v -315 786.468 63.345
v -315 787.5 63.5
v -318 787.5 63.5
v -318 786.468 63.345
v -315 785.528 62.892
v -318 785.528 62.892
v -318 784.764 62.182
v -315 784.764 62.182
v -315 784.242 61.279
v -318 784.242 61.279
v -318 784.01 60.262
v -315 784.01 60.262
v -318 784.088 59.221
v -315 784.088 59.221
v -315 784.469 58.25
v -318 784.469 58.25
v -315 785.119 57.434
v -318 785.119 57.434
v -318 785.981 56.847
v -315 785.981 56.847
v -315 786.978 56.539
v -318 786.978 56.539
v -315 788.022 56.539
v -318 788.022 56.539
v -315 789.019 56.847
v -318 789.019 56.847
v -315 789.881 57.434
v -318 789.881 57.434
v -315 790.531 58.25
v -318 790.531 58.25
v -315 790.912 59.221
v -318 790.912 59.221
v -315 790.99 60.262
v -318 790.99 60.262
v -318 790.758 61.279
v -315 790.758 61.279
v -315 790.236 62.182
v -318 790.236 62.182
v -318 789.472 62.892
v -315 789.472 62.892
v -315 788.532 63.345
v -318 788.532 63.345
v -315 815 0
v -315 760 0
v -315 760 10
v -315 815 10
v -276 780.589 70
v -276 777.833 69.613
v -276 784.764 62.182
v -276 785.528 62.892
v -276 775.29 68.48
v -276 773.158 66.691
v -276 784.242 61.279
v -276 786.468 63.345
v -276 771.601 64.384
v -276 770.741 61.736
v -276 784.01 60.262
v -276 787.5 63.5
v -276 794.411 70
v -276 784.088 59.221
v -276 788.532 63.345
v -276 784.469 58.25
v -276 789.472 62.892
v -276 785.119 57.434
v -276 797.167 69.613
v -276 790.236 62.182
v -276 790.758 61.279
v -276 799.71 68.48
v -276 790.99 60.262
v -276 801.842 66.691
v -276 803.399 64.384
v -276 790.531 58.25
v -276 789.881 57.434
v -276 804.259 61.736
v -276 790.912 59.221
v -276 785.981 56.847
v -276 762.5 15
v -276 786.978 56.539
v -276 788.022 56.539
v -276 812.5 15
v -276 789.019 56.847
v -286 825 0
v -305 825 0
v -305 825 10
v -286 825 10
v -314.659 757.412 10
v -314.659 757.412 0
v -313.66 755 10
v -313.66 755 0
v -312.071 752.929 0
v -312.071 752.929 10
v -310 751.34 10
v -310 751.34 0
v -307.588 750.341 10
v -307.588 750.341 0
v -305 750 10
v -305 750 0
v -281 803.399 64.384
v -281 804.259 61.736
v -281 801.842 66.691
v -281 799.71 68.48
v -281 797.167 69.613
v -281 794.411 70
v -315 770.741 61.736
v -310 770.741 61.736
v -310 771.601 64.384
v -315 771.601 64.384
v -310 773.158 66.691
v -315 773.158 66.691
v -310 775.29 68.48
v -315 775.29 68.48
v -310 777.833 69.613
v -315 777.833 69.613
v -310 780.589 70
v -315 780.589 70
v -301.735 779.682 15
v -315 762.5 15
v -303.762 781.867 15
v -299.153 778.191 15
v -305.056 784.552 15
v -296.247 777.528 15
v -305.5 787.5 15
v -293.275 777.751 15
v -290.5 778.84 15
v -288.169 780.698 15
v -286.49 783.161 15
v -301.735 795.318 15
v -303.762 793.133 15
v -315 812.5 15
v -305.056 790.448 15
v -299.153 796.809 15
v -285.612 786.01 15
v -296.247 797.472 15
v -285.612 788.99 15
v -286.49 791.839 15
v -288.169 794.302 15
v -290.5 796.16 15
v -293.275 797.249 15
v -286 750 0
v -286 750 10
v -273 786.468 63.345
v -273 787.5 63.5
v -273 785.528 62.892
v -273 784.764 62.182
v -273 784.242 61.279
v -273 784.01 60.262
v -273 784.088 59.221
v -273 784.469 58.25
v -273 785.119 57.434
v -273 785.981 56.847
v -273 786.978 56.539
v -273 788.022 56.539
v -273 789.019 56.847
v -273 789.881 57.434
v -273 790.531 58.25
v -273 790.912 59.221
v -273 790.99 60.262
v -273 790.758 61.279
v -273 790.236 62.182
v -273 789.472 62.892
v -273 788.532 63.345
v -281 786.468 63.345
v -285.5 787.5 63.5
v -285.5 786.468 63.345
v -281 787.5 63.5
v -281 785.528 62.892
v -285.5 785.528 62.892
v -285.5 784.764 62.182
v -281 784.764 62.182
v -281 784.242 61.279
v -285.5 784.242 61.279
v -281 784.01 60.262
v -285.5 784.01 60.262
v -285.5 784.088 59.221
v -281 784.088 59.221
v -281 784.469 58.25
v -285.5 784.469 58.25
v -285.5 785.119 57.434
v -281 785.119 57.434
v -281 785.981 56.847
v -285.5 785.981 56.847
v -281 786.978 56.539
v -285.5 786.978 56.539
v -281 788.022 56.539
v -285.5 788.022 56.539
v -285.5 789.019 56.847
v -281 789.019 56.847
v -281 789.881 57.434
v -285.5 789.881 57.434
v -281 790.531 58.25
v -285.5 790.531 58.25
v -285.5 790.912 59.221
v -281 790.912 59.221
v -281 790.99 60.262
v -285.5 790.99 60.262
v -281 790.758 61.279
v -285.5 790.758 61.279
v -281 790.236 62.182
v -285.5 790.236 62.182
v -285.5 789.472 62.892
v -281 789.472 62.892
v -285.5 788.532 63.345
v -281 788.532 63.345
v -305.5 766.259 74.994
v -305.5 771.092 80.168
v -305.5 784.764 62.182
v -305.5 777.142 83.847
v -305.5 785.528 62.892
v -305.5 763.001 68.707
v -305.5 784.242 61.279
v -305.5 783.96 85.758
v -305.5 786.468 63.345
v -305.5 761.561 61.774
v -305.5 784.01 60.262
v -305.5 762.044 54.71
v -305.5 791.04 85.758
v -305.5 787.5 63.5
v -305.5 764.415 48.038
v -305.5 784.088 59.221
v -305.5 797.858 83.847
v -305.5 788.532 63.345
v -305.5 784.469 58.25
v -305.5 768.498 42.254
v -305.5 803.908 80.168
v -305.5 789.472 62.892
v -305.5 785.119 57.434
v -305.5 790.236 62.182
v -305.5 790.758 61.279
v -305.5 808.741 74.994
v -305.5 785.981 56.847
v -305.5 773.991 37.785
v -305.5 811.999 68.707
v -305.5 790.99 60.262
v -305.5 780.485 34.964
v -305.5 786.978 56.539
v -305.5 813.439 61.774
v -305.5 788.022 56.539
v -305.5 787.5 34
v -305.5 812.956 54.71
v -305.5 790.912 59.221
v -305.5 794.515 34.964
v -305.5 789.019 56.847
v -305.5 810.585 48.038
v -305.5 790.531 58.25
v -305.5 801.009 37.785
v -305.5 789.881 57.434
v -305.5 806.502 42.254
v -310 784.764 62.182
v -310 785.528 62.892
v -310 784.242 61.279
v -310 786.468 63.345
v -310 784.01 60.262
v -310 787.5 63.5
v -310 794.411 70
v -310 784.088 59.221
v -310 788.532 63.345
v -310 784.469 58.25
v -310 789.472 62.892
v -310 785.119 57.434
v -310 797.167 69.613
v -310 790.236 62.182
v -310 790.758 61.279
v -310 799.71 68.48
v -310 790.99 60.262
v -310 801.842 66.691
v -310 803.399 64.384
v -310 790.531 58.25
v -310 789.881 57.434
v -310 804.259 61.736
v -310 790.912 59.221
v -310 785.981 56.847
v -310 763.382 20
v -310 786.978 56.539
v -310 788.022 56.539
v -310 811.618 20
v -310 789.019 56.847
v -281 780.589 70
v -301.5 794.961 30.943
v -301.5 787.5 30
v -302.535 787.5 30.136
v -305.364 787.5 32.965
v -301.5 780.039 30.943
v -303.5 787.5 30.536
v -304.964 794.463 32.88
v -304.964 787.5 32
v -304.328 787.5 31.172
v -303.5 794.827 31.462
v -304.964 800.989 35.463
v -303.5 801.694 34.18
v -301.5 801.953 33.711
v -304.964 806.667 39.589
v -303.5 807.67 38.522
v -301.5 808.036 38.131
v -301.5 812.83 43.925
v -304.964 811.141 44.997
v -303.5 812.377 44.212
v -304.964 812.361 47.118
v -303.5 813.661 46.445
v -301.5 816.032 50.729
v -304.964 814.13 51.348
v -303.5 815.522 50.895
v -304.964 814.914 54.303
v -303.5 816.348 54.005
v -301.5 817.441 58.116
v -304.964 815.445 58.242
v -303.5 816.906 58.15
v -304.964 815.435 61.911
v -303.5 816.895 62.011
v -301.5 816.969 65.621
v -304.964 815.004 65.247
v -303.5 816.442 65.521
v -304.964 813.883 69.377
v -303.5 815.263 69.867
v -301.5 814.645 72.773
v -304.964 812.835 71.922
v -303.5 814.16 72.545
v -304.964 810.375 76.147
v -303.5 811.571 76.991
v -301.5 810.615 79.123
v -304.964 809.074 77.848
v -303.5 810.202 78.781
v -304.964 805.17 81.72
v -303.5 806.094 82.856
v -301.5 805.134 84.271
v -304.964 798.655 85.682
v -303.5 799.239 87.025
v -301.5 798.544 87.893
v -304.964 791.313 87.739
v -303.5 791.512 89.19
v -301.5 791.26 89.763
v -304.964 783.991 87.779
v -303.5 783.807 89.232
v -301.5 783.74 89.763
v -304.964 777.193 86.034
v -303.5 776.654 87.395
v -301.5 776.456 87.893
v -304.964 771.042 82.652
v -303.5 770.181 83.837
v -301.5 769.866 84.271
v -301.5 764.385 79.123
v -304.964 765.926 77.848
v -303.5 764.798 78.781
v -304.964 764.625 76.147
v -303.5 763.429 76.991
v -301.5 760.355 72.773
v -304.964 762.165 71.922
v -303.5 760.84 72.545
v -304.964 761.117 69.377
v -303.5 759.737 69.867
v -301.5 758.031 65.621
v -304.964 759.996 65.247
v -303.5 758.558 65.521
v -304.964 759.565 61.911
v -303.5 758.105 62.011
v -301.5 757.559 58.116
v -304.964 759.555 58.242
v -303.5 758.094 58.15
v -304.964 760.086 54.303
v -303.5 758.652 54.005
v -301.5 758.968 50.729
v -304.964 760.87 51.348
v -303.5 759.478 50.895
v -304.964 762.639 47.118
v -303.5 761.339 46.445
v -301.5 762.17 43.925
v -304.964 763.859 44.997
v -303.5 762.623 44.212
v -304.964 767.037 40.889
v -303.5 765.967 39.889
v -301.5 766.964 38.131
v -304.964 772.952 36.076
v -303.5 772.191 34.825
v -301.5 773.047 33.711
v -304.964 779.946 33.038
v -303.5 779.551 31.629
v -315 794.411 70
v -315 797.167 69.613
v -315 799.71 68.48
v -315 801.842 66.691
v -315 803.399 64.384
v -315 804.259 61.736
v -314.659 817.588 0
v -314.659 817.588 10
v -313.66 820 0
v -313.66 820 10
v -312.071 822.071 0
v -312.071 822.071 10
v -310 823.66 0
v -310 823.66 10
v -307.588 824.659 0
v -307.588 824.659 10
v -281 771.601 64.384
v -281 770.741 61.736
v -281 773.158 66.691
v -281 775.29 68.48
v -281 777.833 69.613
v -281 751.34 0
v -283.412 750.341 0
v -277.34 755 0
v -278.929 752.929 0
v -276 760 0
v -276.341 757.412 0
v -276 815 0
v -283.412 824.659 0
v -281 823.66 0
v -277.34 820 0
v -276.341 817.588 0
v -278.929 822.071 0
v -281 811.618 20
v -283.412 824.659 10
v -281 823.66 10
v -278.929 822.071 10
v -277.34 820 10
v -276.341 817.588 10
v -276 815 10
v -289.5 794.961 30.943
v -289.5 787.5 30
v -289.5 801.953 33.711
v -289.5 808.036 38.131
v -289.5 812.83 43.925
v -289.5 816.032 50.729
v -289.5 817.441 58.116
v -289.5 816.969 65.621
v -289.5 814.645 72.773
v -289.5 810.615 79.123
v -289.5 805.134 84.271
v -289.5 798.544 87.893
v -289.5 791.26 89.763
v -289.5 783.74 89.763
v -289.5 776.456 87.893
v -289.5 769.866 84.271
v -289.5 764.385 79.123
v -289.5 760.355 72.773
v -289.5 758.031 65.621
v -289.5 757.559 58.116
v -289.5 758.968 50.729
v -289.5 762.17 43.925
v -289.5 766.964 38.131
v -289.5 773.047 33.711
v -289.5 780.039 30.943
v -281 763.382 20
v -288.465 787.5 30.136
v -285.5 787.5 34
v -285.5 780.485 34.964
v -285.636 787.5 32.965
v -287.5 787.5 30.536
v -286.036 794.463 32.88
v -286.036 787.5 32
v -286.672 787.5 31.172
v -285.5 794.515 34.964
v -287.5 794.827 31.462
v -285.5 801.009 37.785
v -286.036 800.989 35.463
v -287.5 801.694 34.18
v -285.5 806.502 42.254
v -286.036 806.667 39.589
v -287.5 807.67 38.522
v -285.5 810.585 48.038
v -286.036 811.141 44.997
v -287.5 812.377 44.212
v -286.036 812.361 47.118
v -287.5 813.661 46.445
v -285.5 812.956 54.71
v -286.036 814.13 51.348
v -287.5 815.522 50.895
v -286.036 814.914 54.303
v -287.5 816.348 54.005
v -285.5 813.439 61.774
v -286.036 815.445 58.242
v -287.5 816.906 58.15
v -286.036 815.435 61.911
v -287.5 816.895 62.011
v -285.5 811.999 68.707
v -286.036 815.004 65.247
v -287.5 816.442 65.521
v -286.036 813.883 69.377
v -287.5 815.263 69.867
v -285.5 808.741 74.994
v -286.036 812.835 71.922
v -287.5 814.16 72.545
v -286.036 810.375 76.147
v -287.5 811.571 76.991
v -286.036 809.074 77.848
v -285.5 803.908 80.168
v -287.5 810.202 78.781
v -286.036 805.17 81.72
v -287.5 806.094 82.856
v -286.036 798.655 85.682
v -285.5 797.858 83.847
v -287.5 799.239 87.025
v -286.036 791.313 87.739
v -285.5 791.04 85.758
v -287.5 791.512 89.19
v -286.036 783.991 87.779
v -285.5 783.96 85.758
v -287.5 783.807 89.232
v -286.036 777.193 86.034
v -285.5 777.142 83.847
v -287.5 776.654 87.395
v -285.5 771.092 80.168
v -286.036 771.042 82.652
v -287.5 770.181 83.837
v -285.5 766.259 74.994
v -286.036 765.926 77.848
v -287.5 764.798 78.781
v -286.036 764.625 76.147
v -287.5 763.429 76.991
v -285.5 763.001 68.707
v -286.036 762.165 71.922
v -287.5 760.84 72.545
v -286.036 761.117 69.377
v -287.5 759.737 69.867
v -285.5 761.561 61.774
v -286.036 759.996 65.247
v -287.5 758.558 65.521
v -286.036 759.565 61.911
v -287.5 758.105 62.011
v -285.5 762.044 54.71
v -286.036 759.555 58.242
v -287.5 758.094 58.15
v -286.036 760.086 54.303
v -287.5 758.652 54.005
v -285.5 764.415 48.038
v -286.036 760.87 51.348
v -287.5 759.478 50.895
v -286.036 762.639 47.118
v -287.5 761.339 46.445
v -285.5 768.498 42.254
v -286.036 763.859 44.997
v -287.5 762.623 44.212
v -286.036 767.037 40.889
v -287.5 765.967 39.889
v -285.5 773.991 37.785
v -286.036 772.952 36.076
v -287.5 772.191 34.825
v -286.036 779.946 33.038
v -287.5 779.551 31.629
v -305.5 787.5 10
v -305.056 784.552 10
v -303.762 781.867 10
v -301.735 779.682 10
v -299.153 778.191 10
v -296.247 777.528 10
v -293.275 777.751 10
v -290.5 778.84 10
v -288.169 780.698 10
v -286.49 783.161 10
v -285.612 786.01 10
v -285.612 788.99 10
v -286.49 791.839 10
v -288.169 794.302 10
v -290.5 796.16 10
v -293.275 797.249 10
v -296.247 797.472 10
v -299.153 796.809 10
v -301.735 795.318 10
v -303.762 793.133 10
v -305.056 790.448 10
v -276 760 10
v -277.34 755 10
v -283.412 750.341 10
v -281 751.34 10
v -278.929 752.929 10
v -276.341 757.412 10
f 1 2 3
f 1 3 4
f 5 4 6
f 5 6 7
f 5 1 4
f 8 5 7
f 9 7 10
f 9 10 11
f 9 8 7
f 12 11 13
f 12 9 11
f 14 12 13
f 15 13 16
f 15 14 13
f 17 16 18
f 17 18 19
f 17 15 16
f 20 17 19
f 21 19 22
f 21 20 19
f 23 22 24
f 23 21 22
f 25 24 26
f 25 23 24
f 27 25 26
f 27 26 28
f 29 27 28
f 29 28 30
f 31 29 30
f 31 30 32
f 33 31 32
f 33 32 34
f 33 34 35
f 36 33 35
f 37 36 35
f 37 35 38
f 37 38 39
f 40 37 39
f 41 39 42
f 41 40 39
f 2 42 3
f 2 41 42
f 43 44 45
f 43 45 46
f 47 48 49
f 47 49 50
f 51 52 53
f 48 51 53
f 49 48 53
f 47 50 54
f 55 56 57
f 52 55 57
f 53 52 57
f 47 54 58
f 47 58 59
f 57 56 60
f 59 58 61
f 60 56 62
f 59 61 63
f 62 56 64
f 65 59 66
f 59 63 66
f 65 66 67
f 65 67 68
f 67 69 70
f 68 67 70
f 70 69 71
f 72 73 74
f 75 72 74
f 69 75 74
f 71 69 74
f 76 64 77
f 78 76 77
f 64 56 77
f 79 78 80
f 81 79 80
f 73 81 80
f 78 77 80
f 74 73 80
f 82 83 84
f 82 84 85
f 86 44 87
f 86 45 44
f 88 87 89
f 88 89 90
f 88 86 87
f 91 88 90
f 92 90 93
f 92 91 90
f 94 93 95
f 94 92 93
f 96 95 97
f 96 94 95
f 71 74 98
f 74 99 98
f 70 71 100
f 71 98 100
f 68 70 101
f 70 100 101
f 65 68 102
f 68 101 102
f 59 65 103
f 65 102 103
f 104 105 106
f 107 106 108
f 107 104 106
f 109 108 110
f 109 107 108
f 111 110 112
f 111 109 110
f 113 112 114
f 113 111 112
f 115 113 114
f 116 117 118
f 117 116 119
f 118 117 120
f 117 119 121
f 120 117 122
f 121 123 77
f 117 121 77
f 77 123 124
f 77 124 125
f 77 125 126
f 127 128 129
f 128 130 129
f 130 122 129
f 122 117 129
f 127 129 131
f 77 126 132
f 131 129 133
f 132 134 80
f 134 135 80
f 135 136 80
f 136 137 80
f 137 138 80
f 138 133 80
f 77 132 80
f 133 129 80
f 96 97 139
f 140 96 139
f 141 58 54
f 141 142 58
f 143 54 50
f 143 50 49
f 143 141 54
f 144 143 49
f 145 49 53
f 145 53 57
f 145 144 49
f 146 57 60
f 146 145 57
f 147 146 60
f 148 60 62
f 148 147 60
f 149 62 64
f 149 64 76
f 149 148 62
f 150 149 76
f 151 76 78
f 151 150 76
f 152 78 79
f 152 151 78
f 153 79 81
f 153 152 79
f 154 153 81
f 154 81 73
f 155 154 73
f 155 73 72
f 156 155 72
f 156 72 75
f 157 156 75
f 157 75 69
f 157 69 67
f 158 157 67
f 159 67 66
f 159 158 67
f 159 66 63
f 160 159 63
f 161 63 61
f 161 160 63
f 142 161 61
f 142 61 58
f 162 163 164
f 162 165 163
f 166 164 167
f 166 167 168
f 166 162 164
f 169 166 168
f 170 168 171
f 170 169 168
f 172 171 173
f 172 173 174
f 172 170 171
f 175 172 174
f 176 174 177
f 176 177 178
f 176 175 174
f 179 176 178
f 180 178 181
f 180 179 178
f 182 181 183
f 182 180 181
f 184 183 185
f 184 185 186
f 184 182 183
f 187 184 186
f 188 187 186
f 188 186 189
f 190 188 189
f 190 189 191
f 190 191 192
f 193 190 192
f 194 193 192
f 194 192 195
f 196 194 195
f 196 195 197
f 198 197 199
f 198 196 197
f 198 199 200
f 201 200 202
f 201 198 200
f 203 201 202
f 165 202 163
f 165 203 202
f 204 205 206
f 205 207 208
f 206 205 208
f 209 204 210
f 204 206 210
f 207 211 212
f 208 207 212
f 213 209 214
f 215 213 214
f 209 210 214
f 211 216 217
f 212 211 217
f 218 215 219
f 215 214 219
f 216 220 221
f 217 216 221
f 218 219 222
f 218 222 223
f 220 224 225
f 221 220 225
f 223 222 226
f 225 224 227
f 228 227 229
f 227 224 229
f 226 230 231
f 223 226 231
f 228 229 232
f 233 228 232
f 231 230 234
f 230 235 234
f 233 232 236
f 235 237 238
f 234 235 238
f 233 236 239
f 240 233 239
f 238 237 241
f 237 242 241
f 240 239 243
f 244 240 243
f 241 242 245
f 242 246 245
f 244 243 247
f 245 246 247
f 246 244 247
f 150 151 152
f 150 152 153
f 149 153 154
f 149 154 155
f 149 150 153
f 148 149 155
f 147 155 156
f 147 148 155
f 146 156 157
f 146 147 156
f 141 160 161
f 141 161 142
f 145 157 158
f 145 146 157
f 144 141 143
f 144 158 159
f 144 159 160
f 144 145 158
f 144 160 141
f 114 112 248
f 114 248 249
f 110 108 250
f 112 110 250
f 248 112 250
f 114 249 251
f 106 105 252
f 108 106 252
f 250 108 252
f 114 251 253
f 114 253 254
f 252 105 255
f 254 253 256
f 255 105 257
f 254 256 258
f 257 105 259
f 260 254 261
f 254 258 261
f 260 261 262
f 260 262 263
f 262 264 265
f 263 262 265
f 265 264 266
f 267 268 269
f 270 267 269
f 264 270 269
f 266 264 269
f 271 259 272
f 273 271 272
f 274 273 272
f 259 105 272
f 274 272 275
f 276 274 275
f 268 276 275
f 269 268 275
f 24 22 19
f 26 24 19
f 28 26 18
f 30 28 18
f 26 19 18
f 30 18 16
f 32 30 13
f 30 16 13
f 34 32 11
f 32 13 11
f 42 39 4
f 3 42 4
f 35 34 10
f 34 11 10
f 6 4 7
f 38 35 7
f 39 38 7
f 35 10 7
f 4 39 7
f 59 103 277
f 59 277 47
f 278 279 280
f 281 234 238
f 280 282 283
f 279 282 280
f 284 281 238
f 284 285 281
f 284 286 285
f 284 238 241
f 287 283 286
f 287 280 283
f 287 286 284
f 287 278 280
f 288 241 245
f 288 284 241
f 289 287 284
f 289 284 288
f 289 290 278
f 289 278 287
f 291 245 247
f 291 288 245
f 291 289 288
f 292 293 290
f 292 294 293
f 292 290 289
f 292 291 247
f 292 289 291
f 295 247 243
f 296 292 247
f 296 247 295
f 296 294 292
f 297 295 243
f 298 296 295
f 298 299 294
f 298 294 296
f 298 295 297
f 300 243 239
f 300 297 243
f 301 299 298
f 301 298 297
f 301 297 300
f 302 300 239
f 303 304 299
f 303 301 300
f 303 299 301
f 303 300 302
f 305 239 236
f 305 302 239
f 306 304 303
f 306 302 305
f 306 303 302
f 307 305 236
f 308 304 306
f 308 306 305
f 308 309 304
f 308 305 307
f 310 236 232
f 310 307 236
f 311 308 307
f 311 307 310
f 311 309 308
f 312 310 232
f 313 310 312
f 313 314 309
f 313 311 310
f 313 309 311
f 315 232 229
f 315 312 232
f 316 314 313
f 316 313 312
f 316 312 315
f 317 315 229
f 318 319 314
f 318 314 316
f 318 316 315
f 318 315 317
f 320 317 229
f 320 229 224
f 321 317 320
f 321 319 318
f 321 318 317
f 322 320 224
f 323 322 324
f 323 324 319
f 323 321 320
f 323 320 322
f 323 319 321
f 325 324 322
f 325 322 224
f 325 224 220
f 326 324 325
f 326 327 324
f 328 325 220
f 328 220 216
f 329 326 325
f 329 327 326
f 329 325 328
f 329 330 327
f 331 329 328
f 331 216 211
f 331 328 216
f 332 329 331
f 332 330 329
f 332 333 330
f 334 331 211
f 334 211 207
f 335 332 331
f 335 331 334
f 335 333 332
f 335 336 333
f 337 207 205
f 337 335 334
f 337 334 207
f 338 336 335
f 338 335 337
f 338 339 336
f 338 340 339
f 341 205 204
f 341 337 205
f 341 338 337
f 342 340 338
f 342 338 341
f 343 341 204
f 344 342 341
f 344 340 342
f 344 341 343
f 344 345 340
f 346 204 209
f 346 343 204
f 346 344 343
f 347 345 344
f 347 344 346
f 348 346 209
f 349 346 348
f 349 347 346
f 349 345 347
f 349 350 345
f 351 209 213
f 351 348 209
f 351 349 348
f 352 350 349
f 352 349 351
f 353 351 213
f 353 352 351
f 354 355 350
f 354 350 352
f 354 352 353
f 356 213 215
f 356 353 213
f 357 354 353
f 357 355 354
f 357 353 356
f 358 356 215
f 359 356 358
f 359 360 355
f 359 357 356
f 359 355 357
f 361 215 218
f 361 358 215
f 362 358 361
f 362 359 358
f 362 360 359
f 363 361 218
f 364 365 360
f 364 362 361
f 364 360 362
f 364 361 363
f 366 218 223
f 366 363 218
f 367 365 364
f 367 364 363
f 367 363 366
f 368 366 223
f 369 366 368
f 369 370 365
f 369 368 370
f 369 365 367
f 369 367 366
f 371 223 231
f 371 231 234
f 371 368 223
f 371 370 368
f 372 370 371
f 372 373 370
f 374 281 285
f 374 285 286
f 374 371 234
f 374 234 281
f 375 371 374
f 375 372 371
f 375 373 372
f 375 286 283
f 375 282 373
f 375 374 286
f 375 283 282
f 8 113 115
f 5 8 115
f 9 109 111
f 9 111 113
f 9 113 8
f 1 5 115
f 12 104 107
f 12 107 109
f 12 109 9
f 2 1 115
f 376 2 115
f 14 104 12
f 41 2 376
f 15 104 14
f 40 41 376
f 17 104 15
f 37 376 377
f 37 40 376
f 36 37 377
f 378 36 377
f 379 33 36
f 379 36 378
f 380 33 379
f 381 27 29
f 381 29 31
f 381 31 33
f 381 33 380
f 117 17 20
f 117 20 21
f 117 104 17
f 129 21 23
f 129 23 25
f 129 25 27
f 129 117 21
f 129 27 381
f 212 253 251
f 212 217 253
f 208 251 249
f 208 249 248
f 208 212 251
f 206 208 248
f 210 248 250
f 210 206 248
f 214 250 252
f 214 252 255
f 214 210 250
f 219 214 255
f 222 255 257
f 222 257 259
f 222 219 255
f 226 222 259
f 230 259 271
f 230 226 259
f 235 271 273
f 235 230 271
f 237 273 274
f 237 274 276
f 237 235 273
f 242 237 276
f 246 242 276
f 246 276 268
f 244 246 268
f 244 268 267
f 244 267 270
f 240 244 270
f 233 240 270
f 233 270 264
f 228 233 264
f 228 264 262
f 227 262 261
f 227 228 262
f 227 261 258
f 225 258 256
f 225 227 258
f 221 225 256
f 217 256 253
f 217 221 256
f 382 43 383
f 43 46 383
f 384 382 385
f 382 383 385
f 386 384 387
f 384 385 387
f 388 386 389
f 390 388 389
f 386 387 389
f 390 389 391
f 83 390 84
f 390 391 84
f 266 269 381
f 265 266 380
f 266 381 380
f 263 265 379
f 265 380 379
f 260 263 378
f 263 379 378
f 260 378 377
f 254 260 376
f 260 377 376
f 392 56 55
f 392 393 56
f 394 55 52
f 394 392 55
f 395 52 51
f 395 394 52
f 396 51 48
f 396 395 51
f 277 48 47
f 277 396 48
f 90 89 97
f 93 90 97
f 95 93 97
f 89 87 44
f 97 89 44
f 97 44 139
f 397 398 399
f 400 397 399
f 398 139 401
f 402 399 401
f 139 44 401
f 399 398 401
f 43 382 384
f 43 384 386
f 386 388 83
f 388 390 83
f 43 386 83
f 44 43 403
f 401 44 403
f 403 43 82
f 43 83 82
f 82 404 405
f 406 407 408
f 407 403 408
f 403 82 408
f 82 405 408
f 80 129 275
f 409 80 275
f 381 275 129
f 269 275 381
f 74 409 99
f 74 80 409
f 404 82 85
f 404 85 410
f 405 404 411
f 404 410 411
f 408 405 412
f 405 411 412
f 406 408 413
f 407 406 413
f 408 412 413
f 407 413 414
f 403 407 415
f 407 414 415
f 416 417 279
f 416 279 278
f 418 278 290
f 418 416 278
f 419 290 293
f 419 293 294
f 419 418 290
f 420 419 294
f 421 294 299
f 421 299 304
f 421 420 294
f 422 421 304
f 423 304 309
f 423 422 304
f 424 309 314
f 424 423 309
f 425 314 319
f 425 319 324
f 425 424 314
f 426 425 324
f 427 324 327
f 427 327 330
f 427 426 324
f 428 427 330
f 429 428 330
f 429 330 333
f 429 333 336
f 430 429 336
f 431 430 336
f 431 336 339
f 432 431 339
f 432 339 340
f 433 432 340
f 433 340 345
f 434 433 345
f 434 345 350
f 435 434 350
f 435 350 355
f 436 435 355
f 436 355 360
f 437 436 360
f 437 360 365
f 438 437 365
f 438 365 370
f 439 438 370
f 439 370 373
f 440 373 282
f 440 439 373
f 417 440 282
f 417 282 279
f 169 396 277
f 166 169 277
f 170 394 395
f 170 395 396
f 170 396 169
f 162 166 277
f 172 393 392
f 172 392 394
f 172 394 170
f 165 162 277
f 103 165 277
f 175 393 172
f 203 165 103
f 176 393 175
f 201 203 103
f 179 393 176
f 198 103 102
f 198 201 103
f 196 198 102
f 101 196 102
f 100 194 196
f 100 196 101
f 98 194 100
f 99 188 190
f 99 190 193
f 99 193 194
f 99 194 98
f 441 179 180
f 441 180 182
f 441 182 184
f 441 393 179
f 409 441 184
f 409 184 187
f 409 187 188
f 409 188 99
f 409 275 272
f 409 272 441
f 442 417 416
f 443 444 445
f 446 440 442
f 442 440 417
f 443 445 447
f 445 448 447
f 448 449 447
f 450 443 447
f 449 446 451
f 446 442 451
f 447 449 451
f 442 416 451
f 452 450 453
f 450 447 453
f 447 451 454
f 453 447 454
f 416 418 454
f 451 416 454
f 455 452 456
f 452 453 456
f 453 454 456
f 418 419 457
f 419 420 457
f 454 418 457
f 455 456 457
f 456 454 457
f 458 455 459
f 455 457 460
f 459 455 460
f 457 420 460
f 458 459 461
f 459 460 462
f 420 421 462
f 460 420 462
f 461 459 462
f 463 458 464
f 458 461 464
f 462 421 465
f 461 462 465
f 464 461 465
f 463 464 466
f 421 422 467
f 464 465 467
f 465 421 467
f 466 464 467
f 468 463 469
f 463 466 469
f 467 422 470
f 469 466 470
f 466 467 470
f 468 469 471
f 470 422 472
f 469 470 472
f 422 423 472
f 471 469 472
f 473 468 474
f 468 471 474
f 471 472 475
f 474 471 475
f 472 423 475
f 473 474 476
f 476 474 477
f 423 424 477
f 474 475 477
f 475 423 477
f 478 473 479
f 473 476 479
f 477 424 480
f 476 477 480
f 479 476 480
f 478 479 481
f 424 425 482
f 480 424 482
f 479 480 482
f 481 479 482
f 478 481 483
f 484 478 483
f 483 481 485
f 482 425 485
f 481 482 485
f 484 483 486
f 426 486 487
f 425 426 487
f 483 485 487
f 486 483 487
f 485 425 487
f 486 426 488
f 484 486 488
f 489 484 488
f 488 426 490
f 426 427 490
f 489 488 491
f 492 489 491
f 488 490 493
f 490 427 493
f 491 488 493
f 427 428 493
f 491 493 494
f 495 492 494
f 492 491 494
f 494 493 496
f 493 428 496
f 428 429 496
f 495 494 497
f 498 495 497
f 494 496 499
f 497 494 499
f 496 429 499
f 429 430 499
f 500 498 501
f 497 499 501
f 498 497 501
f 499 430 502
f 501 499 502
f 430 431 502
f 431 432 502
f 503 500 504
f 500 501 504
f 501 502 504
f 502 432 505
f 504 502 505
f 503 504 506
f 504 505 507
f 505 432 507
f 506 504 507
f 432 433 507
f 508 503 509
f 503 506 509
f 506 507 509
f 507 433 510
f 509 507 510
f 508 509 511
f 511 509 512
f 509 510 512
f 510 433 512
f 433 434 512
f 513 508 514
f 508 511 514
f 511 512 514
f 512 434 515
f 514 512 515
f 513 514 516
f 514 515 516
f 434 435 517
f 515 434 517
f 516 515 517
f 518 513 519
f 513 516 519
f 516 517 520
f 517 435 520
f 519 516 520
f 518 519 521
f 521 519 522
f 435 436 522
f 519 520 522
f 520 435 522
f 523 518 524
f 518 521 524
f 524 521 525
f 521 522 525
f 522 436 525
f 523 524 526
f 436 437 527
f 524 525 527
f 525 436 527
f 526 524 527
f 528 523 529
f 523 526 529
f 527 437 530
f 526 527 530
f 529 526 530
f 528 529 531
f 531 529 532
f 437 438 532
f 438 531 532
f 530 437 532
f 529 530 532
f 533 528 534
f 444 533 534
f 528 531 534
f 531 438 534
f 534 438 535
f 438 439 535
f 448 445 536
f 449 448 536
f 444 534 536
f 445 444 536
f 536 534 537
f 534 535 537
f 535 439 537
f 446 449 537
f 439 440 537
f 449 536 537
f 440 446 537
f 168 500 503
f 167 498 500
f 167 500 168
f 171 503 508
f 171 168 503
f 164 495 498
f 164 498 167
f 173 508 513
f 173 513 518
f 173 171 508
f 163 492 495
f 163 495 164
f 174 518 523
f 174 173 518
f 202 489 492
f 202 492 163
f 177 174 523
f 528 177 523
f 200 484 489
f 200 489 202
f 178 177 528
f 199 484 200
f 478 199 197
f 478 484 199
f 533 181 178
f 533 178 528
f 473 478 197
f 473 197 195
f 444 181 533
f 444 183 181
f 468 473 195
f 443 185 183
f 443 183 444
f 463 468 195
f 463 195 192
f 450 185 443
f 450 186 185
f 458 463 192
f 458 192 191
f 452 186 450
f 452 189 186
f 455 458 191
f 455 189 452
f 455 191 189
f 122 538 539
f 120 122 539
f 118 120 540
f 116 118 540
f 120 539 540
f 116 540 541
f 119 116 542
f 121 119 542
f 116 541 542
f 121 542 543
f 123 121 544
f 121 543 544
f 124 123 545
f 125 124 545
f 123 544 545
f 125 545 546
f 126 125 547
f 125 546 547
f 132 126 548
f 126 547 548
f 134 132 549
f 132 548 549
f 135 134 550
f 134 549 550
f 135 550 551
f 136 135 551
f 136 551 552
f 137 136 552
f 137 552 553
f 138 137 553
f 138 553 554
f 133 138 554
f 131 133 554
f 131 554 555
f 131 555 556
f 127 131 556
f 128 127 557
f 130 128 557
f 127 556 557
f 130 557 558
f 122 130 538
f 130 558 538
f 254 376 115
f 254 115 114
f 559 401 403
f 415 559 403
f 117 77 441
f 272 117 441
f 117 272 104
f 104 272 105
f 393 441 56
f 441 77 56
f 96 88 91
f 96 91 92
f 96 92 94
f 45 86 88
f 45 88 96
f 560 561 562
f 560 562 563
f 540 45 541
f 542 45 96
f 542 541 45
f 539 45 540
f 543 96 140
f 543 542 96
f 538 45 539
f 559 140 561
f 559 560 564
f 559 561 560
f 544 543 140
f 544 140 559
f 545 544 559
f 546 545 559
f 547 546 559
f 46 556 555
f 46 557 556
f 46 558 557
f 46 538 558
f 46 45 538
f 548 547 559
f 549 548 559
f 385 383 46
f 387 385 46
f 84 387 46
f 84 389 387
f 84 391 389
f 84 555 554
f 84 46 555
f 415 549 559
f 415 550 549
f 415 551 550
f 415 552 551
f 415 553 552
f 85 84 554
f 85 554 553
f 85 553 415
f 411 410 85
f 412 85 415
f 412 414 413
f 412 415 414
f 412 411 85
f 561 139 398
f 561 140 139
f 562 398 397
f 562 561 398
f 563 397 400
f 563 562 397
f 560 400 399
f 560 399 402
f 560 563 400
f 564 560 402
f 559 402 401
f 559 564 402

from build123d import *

# Parameters (mm, degrees)
SKETCH1_W           = 39
SKETCH1_H           = 75
BOSS_EXTRUDE1_DEPTH = 10
SKETCH2_R           = 10
BOSS_EXTRUDE2_DEPTH = 5
SKETCH3_W           = 39
SKETCH3_H           = 50
BOSS_EXTRUDE3_DEPTH = 5
SKETCH4_W           = 5
SKETCH4_H           = 50
BOSS_EXTRUDE4_DEPTH = 50
CUT_EXTRUDE1_REACH  = 830.882
FILLET1_R           = 10
SKETCH6_R           = 30
BOSS_EXTRUDE5_DEPTH = 10
SKETCH7_R           = 3.5
BOSS_EXTRUDE6_DEPTH = 22.5
FILLET2_R           = 4
FILLET3_R           = 10


with BuildPart() as part:
    # Sketch1 → Boss-Extrude1 (new body)
    with BuildSketch(Plane.XY):
        with Locations((-295.5, 787.5)):
            Rectangle(SKETCH1_W, SKETCH1_H)
    extrude(amount=BOSS_EXTRUDE1_DEPTH)

    # Sketch2 → Boss-Extrude2 (add)
    with BuildSketch(Plane.XY.offset(10)):
        with Locations(Location((-295.5, 787.5, 0), (0, 0, 180))):
            Circle(SKETCH2_R)
    extrude(amount=BOSS_EXTRUDE2_DEPTH)

    # Sketch3 → Boss-Extrude3 (add)
    with BuildSketch(Plane.XY.offset(15)):
        with Locations((-295.5, 787.5)):
            Rectangle(SKETCH3_W, SKETCH3_H)
    extrude(amount=BOSS_EXTRUDE3_DEPTH)

    # Sketch4 → Boss-Extrude4 (add)
    with BuildSketch(Plane.XY.offset(20)):
        with Locations((-278.5, 787.5)):
            Rectangle(SKETCH4_W, SKETCH4_H)
        with Locations((-312.5, 787.5)):
            Rectangle(SKETCH4_W, SKETCH4_H)
    extrude(amount=BOSS_EXTRUDE4_DEPTH)

    # Cut-Extrude1: up to this face of the body (flat: up to its plane)
    cut_extrude1_end = Plane(part.part.faces().sort_by_distance((-315, 787.5, 42.5))[0])
    # Sketch5 → Cut-Extrude1 (cut, up to the picked face)
    with BuildSketch(Plane(origin=(-276, 0, 0), x_dir=(0, 0, -1), z_dir=(1, 0, 0)), mode=Mode.PRIVATE) as cut_extrude1_sk1:
        Polygon((-15, 812.5), (-70, 802.802016061), (-70, 812.5), align=None)
    cut_extrude1_tool1 = split(extrude(cut_extrude1_sk1.sketch, amount=-CUT_EXTRUDE1_REACH, mode=Mode.PRIVATE), bisect_by=cut_extrude1_end, keep=Keep.BOTH, mode=Mode.PRIVATE)
    # Sketch5 → Cut-Extrude1 (cut, up to the picked face)
    with BuildSketch(Plane(origin=(-276, 0, 0), x_dir=(0, 0, -1), z_dir=(1, 0, 0)), mode=Mode.PRIVATE) as cut_extrude1_sk2:
        Polygon((-70, 762.5), (-15, 762.5), (-70, 772.197983939), align=None)
    cut_extrude1_tool2 = split(extrude(cut_extrude1_sk2.sketch, amount=-CUT_EXTRUDE1_REACH, mode=Mode.PRIVATE), bisect_by=cut_extrude1_end, keep=Keep.BOTH, mode=Mode.PRIVATE)
    add(cut_extrude1_tool1.solids().sort_by(Axis((-276, 809.267339, 51.666667), (-1, 0, 0)))[0], mode=Mode.SUBTRACT)
    add(cut_extrude1_tool2.solids().sort_by(Axis((-276, 765.732661, 51.666667), (-1, 0, 0)))[0], mode=Mode.SUBTRACT)

    # Fillet1
    fillet1_edges = [part.edges().sort_by_distance(p)[0] for p in [
        (-315, 825, 5),
        (-276, 825, 5),
        (-276, 750, 5),
        (-315, 750, 5),
    ]]
    fillet(fillet1_edges, radius=FILLET1_R)



with BuildPart() as body_2:
    # Sketch6 → Boss-Extrude5 (new, symmetric)
    with BuildSketch(Plane(origin=(-295.5, 0, 0), x_dir=(0, 0, -1), z_dir=(1, 0, 0))):
        with Locations((-60, 787.5)):
            Circle(SKETCH6_R)
    extrude(amount=BOSS_EXTRUDE5_DEPTH, both=True)


with BuildPart() as part_1:
    add(part.part)

    add(body_2.part)  # Boss-Extrude6 merges body 2
    # Sketch7 → Boss-Extrude6 (add, symmetric)
    with BuildSketch(Plane(origin=(-295.5, 0, 0), x_dir=(0, 0, -1), z_dir=(1, 0, 0))):
        with Locations(Location((-60, 787.5, 0), (0, 0, 180))):
            Circle(SKETCH7_R)
    extrude(amount=BOSS_EXTRUDE6_DEPTH, both=True)

    # Fillet2
    fillet2_edges = [part_1.edges().sort_by_distance(p)[0] for p in [
        (-305.5, 787.5, 90),
        (-285.5, 787.5, 90),
    ]]
    fillet(fillet2_edges, radius=FILLET2_R)

    # Fillet3
    fillet3_edges = [part_1.edges().sort_by_distance(p)[0] for p in [
        (-278.5, 802.802016061, 70),
        (-312.5, 802.802016061, 70),
        (-278.5, 772.197983939, 70),
        (-312.5, 772.197983939, 70),
    ]]
    fillet(fillet3_edges, radius=FILLET3_R)


solid = part_1.part
